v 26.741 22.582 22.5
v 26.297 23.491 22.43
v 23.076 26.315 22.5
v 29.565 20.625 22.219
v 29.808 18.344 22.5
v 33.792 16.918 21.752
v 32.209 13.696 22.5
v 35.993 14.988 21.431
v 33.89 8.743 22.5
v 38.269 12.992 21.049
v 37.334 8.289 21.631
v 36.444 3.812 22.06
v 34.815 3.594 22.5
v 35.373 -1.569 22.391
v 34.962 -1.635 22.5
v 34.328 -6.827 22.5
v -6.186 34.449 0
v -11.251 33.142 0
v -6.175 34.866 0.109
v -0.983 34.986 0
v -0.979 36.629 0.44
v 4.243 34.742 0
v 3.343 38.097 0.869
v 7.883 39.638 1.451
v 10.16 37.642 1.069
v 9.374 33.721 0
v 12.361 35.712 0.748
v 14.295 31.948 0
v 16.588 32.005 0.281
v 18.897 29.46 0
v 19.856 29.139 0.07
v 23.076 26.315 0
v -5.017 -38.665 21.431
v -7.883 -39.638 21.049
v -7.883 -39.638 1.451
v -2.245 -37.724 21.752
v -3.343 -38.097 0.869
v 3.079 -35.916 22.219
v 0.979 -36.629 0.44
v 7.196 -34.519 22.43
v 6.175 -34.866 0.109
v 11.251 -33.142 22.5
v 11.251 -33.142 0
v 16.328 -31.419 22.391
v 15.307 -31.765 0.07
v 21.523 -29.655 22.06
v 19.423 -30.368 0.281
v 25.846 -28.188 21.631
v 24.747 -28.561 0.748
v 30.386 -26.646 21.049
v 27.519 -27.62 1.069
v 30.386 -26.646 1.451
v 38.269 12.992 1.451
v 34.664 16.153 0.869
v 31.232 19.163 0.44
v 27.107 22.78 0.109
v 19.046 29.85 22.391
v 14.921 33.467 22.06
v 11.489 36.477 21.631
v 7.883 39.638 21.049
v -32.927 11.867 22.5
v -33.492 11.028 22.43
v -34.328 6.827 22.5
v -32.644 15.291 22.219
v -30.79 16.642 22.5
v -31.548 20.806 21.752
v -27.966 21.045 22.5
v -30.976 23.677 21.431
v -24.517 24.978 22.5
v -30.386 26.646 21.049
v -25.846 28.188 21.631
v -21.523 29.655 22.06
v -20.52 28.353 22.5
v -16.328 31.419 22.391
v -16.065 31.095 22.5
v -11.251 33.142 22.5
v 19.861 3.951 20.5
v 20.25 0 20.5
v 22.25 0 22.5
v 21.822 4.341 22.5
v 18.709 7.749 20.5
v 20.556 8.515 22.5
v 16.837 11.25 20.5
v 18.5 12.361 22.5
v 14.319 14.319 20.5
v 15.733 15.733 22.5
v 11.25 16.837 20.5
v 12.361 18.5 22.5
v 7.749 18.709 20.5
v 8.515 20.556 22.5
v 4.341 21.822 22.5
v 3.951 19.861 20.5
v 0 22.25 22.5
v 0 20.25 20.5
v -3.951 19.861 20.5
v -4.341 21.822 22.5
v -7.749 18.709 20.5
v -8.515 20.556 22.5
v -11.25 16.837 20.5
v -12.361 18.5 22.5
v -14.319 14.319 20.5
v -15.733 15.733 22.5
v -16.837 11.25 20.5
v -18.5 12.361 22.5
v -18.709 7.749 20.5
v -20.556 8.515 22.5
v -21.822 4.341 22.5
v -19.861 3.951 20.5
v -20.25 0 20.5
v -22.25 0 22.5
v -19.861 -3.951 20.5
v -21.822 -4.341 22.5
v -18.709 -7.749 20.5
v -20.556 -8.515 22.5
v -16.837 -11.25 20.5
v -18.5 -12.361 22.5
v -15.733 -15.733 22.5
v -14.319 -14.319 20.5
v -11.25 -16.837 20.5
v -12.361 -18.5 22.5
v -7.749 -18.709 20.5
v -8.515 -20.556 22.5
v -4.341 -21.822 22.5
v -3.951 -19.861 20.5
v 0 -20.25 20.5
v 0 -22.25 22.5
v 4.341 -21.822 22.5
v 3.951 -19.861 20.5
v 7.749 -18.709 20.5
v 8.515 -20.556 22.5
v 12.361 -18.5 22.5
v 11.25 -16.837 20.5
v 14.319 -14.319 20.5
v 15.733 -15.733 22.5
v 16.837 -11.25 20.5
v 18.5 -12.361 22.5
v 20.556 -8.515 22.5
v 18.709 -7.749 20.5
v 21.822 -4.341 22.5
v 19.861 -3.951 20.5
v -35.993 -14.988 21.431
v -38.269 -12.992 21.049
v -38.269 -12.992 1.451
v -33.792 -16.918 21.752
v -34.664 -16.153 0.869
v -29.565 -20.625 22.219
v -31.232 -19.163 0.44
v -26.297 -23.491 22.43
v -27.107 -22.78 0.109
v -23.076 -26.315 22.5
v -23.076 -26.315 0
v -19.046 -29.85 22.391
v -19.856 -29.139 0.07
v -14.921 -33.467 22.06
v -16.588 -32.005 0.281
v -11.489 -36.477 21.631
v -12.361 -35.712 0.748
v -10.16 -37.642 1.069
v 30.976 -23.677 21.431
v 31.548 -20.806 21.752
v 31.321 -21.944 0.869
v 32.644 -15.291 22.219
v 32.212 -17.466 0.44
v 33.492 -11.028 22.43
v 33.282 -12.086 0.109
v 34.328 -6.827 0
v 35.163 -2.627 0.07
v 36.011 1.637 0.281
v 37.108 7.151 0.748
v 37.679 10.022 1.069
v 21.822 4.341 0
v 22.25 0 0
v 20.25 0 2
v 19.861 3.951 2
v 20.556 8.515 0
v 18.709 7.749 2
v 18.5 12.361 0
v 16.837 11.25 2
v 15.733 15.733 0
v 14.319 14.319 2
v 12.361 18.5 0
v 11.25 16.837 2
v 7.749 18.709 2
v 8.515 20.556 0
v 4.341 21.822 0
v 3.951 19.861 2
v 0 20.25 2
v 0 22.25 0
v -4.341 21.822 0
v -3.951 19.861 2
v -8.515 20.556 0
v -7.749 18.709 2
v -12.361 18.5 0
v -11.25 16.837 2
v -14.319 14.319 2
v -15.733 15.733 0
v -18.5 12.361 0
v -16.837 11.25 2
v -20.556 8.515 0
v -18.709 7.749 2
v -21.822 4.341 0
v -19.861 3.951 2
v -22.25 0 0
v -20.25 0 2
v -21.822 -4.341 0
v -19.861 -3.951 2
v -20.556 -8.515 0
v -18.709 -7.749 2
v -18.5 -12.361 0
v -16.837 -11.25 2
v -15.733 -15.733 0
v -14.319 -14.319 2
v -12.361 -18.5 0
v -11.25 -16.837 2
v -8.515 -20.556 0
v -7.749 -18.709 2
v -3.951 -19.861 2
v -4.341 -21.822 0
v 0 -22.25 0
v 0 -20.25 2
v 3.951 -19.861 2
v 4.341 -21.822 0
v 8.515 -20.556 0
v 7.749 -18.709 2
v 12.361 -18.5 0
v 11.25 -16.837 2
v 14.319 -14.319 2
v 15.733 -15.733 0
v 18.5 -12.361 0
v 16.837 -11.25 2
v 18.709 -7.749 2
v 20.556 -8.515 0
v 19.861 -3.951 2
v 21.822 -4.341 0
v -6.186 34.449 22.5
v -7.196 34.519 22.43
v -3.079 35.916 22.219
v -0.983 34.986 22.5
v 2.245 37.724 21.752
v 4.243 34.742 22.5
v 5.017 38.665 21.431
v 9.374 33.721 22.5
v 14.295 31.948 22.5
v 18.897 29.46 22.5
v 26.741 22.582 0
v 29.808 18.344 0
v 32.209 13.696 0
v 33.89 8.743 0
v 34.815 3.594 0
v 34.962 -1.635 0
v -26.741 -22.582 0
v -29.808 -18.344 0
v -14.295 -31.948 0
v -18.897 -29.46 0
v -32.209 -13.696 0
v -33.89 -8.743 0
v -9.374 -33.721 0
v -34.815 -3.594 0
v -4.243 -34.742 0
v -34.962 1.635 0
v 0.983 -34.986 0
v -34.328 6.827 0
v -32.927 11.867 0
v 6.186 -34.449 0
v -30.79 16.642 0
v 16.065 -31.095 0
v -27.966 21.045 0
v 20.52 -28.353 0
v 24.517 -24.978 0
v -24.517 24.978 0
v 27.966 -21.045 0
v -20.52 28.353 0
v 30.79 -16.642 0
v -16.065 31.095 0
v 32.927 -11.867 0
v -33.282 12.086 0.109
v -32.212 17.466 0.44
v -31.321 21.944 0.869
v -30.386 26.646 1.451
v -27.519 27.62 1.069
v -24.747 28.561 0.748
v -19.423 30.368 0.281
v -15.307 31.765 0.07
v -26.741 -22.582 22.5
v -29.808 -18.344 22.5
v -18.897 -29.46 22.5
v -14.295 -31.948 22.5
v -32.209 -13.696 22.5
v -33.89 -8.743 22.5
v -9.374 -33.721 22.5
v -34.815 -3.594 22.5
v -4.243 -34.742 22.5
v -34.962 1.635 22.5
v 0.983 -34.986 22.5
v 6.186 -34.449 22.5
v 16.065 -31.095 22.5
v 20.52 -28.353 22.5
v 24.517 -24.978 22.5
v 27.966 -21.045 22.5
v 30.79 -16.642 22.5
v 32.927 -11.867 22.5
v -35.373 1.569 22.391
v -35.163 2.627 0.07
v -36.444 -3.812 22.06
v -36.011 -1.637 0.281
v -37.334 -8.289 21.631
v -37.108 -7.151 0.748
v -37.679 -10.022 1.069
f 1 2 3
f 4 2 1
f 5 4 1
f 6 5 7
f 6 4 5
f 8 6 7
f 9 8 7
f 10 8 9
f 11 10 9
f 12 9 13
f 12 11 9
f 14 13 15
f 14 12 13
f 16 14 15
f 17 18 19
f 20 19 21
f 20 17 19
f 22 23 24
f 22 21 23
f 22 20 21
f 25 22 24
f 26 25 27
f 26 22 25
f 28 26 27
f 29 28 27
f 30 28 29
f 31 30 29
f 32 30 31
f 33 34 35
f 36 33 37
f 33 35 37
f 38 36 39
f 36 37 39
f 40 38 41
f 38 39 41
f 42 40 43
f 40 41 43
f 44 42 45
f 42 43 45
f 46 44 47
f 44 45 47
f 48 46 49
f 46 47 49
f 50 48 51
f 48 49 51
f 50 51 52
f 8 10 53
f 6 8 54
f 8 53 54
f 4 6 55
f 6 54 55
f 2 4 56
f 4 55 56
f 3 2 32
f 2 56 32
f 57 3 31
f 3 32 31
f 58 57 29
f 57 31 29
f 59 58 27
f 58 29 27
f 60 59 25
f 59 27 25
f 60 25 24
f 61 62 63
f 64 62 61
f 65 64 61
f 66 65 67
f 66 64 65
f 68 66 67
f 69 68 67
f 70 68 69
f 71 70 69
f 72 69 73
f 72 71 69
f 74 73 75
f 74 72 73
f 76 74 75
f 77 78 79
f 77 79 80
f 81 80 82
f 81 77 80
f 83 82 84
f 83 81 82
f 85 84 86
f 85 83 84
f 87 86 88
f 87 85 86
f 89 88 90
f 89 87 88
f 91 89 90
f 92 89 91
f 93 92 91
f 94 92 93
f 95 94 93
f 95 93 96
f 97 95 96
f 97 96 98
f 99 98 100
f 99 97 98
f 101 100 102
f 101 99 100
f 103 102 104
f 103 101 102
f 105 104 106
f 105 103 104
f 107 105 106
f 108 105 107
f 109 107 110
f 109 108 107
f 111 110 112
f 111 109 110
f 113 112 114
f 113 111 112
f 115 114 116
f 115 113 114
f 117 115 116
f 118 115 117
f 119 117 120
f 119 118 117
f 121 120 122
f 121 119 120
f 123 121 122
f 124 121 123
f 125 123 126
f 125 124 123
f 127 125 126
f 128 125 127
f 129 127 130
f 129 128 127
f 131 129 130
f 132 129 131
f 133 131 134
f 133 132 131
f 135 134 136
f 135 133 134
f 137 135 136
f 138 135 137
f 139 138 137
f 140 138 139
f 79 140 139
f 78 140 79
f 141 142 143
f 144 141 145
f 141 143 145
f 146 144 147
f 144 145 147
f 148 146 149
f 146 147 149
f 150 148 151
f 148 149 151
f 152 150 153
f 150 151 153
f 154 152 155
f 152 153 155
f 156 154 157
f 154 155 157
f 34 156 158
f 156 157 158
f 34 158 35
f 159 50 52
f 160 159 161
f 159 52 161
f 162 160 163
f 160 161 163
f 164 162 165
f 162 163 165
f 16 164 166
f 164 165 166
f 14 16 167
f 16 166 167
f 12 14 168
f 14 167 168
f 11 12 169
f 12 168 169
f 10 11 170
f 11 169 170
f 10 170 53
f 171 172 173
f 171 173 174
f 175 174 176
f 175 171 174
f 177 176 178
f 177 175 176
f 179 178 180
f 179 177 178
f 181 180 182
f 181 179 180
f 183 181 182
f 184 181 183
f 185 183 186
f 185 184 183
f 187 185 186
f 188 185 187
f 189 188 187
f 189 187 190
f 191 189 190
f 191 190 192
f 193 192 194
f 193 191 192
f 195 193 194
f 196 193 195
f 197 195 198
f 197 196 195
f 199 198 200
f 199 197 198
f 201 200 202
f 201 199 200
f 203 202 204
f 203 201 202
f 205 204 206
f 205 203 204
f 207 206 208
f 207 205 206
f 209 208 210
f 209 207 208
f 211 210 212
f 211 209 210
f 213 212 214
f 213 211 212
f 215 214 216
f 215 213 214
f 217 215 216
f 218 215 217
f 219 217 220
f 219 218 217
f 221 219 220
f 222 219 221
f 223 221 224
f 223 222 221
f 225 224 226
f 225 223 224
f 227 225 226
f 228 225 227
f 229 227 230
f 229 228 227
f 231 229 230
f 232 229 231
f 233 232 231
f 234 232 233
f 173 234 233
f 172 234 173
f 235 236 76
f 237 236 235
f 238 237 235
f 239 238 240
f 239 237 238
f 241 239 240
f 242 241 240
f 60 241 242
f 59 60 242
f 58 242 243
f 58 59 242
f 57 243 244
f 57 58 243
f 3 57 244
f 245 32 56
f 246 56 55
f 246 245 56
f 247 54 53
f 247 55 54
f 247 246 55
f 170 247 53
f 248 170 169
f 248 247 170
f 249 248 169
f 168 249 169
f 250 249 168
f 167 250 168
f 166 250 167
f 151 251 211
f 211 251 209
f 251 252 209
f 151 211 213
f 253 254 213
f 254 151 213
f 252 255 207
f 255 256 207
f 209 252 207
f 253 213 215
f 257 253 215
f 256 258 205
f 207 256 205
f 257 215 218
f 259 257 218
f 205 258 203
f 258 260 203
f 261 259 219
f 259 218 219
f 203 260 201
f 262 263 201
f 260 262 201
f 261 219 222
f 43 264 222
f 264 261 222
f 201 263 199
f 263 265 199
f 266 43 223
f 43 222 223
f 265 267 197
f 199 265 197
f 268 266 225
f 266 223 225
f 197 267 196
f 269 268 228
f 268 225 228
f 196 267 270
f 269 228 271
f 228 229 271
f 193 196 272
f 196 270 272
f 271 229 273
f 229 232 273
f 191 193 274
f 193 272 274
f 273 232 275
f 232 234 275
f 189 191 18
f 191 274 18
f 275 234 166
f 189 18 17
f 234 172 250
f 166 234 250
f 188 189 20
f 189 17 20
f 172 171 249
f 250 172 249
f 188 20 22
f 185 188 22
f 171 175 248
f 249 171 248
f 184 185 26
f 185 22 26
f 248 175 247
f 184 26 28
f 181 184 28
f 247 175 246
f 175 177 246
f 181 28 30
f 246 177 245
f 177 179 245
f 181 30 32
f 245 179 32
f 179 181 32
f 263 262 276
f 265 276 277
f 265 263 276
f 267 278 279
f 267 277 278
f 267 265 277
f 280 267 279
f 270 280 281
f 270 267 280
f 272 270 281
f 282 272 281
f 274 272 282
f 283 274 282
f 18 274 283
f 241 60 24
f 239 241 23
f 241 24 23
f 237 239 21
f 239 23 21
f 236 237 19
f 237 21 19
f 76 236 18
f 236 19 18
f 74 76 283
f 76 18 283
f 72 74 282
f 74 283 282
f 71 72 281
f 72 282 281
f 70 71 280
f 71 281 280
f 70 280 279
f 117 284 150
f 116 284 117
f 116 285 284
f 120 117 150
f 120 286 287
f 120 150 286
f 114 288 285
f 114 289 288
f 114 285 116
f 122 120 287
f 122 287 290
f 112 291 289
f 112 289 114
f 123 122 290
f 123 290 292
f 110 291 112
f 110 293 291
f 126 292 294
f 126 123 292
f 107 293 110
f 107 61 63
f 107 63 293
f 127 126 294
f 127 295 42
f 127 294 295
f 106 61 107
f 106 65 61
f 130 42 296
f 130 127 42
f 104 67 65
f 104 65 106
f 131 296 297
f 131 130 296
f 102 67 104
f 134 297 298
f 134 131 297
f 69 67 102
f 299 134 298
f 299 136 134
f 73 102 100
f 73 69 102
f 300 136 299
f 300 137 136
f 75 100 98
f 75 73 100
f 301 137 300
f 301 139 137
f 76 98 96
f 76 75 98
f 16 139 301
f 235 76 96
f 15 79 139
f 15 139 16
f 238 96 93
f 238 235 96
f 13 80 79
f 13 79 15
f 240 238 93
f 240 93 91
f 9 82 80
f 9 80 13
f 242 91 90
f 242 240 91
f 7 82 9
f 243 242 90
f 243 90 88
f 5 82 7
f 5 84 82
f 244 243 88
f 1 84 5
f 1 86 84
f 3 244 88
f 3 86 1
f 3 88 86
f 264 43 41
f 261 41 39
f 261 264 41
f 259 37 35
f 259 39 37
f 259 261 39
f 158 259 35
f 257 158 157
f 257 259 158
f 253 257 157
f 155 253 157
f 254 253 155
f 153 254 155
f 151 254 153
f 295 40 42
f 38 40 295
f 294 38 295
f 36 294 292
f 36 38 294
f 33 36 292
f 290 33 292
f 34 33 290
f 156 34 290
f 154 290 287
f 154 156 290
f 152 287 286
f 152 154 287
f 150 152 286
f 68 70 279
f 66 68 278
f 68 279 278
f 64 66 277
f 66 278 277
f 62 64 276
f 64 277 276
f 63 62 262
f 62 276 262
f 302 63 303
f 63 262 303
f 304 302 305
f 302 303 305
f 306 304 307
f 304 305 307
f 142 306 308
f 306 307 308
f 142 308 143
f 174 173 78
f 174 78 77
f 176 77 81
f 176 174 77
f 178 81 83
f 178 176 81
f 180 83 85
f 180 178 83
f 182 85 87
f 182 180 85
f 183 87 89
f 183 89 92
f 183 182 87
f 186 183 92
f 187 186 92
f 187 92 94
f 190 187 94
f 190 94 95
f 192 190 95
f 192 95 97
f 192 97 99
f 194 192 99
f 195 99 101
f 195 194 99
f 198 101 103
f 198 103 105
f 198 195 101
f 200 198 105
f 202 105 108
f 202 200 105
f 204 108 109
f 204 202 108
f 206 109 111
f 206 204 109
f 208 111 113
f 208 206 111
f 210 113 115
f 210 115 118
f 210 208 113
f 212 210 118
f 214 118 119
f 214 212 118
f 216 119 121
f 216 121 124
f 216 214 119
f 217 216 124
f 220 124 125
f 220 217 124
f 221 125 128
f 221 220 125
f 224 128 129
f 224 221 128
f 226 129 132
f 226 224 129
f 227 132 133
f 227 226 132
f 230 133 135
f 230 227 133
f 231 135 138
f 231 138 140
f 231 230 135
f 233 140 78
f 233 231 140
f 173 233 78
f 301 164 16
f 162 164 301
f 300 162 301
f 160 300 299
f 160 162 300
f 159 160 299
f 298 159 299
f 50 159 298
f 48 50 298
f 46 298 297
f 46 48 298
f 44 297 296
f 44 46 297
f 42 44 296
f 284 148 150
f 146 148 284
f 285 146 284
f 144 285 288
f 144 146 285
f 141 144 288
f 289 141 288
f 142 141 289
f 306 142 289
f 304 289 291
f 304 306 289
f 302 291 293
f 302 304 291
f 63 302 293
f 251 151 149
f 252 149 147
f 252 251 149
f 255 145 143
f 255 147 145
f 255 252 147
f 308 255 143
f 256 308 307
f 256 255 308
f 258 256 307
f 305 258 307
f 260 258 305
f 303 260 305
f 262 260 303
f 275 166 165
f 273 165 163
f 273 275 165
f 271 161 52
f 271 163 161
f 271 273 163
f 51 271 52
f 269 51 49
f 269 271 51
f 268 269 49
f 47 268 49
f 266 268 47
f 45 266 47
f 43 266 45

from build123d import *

# Parameters (mm, degrees)
F0_R     = 20.25
F1_DEPTH = 22.5
F6_SIZE  = 2


with BuildPart() as f1:
    # F0 (on Top) → F1 (new body)
    with BuildSketch(Plane.XY):
        Polygon((30.385918036, -26.6463753341), (38.2693969761, 12.9917892694), (7.8834789401, 39.6381646035), (-30.385918036, 26.6463753341), (-38.2693969761, -12.9917892694), (-7.8834789401, -39.6381646035), align=None)
        Circle(F0_R, mode=Mode.SUBTRACT)
    extrude(amount=F1_DEPTH)

    # F4 (on 3pt) → F5 (revolve, cut)
    with BuildSketch(Plane(origin=(0, 0, 0), x_dir=(0.9469219991, 0.3214634157, 0), z_dir=(0.3214634157, -0.9469219991, 0))):
        Polygon((35, 22.707875818), (35, 22.5), (44.6592582629, 19.911809549), (44.6592582629, 22.707875818), align=None)
        Polygon((44.6592582629, 2.588190451), (35, 0), (35, -0.207875818), (44.6592582629, -0.207875818), align=None)
    revolve(axis=Axis((0, 0, 0), (0, 0, -1)), mode=Mode.SUBTRACT)

    # F6
    f6_edges = [f1.edges().sort_by_distance(p)[0] for p in [
        (-20.25, 0, 22.5),
        (-20.25, 0, 0),
    ]]
    chamfer(f6_edges, length=F6_SIZE)


solid = f1.part
